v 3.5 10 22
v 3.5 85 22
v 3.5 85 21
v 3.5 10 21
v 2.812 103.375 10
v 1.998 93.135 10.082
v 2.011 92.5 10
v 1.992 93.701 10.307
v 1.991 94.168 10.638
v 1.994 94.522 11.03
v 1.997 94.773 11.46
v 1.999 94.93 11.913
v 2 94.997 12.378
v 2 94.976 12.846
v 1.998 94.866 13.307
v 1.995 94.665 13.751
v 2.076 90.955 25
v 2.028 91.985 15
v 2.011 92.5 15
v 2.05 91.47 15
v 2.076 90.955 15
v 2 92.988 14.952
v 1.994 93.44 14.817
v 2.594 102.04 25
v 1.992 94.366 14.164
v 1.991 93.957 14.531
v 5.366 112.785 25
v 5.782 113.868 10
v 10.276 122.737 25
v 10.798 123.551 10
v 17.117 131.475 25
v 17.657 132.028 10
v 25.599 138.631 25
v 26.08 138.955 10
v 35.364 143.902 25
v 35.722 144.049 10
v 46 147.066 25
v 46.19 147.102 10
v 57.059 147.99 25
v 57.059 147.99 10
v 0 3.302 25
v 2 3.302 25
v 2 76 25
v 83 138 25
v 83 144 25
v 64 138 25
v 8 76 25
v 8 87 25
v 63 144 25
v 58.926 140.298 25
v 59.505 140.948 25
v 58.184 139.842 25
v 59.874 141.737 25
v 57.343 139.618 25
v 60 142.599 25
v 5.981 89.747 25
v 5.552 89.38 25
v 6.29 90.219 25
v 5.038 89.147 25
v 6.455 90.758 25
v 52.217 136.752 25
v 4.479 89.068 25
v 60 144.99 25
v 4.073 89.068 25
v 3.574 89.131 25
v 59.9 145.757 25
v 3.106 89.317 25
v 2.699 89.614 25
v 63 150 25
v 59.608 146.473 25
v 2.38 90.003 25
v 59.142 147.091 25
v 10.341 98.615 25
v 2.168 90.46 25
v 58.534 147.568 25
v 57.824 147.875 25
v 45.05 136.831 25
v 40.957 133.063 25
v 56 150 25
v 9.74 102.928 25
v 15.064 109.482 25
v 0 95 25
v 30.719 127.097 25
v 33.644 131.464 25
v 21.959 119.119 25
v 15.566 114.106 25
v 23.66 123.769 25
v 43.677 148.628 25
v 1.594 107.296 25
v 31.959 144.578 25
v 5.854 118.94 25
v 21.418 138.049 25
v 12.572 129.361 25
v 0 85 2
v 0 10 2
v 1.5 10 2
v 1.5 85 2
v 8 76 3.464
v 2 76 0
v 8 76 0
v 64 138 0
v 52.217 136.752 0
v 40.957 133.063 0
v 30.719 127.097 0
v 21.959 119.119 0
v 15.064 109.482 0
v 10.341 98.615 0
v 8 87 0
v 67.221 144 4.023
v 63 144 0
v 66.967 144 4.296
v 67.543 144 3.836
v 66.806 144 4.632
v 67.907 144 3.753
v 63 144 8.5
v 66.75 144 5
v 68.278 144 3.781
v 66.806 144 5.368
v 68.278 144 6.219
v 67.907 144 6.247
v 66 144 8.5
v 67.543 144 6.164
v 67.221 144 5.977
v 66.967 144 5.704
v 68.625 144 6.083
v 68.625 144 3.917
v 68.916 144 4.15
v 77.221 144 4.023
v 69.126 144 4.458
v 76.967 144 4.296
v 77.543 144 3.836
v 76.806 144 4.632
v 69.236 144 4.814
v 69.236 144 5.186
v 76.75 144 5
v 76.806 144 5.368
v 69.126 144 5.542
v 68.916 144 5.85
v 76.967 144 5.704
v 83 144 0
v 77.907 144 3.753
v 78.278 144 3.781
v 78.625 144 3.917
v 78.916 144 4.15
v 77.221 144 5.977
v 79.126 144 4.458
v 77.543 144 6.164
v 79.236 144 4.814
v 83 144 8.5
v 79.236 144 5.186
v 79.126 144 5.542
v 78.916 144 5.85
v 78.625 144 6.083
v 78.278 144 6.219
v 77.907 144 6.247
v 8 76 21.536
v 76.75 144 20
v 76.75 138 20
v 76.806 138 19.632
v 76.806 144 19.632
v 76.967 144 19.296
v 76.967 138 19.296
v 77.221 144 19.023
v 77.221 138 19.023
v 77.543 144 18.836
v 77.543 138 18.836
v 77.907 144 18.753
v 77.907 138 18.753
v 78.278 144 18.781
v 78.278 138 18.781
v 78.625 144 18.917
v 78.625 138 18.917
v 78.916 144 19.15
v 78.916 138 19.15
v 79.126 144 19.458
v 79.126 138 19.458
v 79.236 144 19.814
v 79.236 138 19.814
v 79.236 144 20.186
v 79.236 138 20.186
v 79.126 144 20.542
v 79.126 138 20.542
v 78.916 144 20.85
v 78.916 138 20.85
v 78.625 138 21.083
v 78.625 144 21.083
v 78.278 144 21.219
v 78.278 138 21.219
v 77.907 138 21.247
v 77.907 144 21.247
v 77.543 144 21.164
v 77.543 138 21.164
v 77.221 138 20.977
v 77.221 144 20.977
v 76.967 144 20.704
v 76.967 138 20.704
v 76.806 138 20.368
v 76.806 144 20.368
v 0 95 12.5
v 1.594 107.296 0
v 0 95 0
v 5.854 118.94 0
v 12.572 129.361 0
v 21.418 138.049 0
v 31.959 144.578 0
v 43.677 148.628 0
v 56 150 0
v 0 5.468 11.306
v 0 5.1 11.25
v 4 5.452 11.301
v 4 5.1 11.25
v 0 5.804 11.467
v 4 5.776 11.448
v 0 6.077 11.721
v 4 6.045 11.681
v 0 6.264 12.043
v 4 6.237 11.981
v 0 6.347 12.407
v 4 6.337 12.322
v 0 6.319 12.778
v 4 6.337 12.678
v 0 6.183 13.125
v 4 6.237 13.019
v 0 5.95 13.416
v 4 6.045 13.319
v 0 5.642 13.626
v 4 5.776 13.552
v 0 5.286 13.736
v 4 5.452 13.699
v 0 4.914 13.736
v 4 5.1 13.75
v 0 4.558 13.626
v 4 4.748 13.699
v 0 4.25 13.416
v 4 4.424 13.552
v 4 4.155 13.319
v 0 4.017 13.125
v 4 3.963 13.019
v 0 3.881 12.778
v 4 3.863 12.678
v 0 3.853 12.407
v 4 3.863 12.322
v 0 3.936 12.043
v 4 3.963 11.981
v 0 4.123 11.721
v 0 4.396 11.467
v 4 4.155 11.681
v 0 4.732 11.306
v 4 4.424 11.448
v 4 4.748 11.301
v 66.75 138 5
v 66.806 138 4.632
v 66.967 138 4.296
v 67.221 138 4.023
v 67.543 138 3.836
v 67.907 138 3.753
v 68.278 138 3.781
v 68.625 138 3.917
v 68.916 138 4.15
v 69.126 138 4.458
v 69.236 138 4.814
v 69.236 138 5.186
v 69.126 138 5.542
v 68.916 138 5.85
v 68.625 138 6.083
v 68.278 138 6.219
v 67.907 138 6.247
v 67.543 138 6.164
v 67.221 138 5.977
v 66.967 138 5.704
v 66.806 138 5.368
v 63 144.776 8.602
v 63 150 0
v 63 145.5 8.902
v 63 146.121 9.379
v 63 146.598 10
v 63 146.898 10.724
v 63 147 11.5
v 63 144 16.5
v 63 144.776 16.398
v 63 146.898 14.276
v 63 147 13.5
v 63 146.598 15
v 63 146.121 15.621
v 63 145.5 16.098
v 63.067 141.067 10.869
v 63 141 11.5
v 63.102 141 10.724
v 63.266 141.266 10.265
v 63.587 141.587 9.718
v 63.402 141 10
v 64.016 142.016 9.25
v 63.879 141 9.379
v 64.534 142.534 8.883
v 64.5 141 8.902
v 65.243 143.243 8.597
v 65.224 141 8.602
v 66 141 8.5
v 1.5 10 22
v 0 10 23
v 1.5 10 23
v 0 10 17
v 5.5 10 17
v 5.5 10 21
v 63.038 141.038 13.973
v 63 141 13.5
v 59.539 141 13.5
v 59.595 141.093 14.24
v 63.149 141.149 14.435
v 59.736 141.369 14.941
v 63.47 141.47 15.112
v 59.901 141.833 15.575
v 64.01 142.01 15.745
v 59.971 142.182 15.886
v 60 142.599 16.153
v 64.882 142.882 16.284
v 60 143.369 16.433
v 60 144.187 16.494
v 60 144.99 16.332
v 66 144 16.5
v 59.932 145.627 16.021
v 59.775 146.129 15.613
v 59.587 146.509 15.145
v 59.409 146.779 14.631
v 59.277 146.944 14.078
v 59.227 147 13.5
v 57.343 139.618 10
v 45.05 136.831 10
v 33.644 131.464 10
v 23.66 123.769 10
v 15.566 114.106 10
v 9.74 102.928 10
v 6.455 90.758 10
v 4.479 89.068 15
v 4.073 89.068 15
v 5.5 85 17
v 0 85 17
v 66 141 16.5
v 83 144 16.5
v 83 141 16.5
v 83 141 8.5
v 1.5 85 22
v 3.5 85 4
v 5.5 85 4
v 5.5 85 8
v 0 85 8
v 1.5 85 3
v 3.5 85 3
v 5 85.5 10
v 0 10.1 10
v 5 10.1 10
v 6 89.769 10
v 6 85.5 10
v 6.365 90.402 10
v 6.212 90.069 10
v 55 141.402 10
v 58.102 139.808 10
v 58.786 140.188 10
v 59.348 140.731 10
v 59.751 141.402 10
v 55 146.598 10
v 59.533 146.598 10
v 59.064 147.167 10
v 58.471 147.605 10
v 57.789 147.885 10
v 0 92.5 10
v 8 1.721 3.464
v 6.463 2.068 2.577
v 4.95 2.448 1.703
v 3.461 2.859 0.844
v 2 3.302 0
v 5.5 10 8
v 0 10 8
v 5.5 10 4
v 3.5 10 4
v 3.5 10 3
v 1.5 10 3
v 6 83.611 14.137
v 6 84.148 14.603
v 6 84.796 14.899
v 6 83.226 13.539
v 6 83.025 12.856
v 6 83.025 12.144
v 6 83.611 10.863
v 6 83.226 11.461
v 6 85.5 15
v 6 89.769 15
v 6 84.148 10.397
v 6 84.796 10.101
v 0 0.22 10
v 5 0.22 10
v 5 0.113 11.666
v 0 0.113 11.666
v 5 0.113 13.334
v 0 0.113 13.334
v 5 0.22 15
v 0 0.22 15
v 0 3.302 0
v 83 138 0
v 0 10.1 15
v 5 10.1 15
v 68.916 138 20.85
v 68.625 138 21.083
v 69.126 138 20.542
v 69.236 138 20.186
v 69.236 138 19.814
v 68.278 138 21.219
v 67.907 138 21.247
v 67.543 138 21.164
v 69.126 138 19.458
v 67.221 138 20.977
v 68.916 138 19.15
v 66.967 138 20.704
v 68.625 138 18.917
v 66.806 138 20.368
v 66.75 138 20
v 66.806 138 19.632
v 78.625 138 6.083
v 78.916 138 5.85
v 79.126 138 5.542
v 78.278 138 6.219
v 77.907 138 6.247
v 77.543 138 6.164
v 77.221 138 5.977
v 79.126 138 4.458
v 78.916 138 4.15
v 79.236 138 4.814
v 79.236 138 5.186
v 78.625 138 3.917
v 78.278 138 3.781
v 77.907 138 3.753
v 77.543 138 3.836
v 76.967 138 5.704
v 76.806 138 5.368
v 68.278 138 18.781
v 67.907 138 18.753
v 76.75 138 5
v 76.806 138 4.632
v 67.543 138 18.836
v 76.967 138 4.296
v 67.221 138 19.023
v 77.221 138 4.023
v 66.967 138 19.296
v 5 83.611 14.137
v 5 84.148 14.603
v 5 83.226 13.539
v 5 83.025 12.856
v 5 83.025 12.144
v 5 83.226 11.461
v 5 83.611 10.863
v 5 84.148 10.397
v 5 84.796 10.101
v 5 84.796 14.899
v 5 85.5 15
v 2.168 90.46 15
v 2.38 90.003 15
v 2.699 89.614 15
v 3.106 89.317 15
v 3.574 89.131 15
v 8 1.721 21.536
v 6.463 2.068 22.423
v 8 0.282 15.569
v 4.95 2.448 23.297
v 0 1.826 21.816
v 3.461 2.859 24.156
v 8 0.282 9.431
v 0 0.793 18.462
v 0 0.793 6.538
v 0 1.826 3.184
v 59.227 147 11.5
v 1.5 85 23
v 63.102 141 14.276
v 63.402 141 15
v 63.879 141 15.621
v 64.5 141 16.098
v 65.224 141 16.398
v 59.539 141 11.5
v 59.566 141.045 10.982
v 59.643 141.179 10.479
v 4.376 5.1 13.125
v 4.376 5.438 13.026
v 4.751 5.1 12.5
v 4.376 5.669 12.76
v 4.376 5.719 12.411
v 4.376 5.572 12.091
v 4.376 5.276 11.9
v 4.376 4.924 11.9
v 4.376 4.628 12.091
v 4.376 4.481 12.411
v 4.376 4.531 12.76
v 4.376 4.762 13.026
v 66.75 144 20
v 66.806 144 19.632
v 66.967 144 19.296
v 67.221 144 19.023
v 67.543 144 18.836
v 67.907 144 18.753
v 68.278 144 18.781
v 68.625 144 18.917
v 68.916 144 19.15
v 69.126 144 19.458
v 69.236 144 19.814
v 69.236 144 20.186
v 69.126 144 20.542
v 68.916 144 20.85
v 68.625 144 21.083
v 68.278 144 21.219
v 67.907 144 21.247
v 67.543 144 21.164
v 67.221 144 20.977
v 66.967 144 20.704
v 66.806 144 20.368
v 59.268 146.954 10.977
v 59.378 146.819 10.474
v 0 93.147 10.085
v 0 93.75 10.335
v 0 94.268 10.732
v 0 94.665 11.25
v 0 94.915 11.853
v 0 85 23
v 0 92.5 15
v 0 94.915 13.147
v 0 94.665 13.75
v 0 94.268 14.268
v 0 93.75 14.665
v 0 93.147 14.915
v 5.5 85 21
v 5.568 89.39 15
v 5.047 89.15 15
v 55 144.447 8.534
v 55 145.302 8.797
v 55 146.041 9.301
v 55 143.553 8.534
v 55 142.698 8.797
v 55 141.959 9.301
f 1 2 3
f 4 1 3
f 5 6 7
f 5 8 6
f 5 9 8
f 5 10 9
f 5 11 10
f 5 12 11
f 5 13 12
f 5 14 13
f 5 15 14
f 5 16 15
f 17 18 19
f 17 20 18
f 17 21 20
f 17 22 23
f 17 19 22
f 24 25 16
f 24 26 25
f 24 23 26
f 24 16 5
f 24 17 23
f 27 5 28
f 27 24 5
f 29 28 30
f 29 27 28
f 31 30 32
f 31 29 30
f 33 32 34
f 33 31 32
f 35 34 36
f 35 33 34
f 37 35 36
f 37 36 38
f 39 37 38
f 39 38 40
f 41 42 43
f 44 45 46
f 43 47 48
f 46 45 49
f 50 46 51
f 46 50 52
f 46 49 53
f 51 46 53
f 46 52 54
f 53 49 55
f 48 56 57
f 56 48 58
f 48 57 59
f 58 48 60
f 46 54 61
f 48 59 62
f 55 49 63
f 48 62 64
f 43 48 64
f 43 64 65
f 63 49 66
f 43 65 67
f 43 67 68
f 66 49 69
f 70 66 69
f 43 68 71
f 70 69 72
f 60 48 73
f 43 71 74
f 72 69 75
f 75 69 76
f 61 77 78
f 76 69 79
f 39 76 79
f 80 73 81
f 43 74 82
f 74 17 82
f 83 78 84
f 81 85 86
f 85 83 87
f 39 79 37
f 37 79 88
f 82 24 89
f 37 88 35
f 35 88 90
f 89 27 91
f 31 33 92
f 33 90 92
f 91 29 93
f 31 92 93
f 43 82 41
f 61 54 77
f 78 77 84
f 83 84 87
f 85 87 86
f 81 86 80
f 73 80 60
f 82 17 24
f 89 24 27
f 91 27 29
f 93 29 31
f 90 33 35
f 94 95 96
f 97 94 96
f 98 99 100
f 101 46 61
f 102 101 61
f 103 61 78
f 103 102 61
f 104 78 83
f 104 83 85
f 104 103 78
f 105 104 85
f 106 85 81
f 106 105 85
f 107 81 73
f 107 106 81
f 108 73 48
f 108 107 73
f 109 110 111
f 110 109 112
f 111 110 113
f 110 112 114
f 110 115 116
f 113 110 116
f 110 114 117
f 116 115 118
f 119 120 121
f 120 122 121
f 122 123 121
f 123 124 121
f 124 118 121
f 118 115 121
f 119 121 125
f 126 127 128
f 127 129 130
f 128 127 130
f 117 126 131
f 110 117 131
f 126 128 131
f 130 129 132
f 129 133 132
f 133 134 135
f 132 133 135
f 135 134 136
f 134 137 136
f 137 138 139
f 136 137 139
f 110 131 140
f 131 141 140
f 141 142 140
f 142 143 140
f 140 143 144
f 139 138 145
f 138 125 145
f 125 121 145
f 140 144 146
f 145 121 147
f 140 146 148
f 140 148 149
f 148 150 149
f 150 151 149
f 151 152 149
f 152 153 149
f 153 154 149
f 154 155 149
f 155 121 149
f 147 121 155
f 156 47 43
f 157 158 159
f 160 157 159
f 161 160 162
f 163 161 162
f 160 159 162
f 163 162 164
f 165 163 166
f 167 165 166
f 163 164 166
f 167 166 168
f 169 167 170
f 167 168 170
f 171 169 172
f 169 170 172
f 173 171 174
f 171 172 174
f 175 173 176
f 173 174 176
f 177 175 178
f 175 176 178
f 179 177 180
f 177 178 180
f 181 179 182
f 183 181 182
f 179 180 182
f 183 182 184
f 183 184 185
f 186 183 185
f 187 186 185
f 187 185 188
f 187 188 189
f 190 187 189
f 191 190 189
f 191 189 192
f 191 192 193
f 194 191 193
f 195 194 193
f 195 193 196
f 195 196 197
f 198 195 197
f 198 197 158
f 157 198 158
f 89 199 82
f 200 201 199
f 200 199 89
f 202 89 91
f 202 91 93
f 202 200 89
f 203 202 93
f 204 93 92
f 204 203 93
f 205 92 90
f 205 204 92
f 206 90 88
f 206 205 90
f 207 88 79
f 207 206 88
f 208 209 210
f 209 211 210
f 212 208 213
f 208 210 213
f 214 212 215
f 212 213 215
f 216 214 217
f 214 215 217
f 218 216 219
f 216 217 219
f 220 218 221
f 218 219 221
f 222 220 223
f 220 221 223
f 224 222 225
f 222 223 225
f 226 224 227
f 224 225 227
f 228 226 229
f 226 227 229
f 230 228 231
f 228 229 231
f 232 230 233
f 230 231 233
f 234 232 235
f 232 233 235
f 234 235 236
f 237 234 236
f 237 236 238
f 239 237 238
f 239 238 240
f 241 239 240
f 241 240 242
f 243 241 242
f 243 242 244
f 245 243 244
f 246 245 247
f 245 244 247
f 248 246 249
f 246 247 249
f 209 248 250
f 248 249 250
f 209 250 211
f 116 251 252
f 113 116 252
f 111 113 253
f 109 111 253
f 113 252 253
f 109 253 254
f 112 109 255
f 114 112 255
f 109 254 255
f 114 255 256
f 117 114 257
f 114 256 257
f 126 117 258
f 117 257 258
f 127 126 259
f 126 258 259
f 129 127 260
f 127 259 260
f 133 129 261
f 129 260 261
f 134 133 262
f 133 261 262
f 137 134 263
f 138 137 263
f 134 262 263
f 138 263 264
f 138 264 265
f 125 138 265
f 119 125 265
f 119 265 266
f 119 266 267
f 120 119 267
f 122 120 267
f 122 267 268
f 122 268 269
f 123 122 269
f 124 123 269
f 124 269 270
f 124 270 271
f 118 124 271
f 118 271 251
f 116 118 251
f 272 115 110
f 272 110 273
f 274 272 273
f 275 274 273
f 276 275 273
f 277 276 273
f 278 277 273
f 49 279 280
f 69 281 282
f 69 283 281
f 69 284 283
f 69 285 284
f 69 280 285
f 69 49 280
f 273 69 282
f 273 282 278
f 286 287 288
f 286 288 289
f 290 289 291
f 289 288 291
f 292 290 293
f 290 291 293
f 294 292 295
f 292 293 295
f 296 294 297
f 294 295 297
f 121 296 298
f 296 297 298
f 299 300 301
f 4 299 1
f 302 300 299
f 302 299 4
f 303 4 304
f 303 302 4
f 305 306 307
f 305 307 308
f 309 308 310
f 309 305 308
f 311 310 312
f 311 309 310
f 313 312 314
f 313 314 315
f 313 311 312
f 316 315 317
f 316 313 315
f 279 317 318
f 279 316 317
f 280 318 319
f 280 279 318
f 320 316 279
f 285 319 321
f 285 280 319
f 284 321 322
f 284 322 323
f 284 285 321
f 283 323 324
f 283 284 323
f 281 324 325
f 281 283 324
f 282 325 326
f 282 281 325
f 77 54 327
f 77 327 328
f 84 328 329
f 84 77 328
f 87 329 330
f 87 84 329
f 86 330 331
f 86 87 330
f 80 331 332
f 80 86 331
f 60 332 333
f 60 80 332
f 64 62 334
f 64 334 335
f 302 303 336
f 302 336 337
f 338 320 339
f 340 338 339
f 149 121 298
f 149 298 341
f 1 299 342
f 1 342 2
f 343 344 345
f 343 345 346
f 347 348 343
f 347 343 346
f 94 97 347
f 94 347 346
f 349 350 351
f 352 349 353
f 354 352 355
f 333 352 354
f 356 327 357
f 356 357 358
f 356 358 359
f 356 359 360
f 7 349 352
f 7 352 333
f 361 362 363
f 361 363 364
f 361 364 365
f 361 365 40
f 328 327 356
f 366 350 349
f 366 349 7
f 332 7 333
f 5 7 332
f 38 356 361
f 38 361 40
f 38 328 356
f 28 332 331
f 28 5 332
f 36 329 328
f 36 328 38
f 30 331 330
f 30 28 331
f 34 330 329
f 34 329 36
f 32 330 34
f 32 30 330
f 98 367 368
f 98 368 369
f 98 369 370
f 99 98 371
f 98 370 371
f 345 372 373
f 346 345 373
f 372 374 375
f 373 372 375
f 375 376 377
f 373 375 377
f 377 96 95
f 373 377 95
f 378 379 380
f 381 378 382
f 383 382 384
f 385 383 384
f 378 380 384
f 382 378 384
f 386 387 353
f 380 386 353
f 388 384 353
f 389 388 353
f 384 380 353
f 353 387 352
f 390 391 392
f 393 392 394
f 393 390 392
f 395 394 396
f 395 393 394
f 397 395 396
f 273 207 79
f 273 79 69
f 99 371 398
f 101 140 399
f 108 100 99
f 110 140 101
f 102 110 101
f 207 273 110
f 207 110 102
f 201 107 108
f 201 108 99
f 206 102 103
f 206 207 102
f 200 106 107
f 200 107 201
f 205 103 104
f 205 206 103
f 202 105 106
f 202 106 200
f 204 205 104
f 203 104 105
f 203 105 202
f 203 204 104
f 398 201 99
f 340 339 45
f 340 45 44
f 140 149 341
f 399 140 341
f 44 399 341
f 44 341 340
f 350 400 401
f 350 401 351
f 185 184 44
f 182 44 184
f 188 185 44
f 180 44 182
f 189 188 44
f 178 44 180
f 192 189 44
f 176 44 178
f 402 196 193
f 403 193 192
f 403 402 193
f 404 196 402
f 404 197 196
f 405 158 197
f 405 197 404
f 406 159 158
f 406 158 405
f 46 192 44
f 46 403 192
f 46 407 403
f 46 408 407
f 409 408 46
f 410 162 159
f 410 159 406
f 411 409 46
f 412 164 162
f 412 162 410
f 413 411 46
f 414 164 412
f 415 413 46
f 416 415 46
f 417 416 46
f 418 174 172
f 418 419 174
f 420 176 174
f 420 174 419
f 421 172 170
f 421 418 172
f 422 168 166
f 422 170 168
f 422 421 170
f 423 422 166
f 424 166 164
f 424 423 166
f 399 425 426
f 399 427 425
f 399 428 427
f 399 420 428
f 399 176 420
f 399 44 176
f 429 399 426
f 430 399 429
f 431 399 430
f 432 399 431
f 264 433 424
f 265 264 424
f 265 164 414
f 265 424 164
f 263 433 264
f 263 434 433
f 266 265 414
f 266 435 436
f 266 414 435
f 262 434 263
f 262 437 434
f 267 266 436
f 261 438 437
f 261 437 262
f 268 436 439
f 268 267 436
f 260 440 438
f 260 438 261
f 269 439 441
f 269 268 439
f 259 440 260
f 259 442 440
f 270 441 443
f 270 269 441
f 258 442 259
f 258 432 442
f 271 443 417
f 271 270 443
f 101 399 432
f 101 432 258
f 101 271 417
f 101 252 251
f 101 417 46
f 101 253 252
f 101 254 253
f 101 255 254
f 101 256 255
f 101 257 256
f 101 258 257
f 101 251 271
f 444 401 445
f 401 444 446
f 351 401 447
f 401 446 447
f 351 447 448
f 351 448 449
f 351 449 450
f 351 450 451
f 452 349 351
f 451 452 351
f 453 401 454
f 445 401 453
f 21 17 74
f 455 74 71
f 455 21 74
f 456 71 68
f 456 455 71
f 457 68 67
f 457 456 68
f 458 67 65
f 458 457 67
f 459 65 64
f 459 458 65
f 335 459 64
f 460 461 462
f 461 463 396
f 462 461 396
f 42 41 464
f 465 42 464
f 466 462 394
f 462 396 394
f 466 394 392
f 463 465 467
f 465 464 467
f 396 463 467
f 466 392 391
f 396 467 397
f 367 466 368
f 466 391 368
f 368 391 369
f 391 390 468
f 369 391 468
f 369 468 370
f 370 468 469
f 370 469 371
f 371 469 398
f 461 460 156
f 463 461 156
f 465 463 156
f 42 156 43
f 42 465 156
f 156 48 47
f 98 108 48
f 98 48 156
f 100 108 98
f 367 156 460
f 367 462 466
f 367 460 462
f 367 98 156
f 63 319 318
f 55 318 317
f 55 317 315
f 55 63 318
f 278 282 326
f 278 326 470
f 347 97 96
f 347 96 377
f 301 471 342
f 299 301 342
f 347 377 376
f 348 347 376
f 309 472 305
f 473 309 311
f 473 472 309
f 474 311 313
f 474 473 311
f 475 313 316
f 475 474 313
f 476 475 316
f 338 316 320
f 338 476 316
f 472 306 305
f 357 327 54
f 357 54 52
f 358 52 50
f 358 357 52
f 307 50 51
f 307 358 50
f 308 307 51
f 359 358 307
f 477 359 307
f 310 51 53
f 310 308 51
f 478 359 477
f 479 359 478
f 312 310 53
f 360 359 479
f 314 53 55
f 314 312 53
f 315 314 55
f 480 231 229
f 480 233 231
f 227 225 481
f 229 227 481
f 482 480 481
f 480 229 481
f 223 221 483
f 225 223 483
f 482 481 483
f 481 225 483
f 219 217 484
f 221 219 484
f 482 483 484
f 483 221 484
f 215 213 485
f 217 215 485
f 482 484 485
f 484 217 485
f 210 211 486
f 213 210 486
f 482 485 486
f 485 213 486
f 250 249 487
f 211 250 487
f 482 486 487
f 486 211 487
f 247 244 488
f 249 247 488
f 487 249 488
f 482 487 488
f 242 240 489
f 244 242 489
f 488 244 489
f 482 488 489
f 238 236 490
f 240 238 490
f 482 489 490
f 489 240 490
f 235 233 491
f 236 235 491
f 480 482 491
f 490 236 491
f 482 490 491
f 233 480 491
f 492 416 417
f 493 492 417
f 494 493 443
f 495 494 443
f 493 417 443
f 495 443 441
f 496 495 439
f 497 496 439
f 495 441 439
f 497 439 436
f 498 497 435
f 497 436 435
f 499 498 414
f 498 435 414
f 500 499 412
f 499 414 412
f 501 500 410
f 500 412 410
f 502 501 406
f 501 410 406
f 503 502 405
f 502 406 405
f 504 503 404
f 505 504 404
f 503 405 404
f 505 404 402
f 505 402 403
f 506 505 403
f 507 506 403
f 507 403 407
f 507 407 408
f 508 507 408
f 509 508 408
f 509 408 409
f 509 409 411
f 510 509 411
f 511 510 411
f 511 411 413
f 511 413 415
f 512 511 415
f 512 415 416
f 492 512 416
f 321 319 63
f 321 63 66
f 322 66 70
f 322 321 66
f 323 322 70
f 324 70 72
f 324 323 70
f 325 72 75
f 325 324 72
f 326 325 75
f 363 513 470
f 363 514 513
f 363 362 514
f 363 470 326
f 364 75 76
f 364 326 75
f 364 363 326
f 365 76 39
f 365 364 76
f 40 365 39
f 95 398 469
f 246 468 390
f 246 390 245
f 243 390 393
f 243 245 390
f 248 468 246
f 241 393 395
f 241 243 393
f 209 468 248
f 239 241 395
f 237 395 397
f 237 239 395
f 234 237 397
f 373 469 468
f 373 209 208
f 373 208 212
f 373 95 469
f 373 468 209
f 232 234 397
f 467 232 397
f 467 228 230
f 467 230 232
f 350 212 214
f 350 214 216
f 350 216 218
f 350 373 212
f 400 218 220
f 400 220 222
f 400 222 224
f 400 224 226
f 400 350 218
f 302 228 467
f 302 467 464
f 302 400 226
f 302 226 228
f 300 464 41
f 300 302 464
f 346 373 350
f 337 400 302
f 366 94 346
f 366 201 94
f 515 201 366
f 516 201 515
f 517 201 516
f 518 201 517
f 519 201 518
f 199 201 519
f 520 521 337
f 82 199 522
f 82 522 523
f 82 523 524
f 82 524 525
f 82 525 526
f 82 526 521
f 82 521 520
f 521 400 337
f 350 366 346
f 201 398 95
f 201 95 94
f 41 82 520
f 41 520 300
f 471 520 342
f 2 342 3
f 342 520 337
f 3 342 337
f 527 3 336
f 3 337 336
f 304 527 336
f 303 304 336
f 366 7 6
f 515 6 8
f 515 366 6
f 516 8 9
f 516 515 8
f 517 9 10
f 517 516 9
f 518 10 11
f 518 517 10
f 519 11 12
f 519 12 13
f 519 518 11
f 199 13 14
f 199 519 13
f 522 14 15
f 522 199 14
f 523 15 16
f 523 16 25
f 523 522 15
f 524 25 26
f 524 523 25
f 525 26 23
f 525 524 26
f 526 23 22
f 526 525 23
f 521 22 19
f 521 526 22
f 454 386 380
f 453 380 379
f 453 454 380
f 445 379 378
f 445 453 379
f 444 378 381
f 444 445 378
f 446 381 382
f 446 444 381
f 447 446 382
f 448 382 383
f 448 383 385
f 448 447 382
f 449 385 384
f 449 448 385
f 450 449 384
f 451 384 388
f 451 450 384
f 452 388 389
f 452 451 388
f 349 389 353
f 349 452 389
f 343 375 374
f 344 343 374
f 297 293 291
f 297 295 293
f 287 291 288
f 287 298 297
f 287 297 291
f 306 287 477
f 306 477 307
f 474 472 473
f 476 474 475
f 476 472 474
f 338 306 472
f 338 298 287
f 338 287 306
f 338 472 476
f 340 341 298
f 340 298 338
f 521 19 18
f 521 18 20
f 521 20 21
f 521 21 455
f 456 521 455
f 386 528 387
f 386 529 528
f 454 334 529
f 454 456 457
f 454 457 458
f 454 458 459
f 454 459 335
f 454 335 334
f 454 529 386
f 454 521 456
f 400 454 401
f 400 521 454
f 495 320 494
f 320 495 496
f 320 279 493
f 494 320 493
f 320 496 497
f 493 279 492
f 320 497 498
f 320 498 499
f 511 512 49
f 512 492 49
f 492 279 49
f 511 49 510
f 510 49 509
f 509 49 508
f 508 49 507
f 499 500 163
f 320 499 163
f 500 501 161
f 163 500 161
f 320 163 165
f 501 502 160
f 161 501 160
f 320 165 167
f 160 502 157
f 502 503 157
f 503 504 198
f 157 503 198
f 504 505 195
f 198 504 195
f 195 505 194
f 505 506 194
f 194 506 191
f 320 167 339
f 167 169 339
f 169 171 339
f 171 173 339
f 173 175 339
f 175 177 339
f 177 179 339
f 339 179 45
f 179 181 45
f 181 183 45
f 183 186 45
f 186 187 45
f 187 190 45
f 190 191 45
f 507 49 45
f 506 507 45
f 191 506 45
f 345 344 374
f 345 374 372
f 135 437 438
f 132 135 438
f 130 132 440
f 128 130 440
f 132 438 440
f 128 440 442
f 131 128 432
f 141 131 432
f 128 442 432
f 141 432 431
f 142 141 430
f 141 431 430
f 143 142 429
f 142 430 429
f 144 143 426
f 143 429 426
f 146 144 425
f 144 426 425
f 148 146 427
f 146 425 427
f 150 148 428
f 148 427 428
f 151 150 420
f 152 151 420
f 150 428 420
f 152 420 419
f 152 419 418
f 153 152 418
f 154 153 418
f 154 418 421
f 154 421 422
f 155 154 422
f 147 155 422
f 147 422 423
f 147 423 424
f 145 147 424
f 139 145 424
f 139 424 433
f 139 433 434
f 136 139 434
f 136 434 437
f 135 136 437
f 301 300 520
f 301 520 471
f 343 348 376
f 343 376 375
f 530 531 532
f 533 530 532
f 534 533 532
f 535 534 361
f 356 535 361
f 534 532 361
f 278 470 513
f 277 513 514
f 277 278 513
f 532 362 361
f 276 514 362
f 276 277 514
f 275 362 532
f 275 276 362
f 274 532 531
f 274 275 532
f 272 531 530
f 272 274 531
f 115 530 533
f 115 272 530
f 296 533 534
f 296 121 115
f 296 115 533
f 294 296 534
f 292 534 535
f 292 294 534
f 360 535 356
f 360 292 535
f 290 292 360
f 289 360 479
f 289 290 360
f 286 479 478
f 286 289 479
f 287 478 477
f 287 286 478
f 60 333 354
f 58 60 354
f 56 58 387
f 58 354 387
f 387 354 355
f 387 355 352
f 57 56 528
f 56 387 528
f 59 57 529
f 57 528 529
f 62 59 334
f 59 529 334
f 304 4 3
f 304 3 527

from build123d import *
from OCP.BRepAlgoAPI import BRepAlgoAPI_Cut
from OCP.TopTools import TopTools_ListOfShape

# Parameters (mm, degrees)
EXTRUDE_1_DEPTH      = 25
SKETCH_2_W           = 20
SKETCH_2_H           = 6
CUT_EXTRUDE_1_DEPTH  = 174.245490562
CUT_EXTRUDE_2_DEPTH  = 76
CUT_EXTRUDE_4_DEPTH  = 5
CUT_EXTRUDE_3_REACH  = 175.245
FILLET_3_R           = 2
FILLET_4_R           = 3
CUT_EXTRUDE_6_DEPTH  = 75
M3X0_51_D            = 2.5
CUT_EXTRUDE_7_REACH  = 175.245
SKETCH_13_W          = 20
SKETCH_13_H          = 8
CUT_EXTRUDE_8_DEPTH  = 3
FILLET_8_R           = 3
CUT_EXTRUDE_9_DEPTH  = 28
CUT_EXTRUDE_10_DEPTH = 6
EXTRUDE_2_DEPTH      = 5
M3X0_52_D            = 2.5
M3X0_52_DEPTH        = 4
M3X0_52_TIP          = 0.751075774


with BuildPart() as part:
    # Эскиз1 → Бобышка-Вытянуть1 (new body)
    with BuildSketch(Plane.XY):
        with BuildLine():
            Line((0, 0), (0, 95))
            ThreePointArc((0, 95), (16.753981094, 133.950491977), (56, 150))
            Line((56, 150), (83, 150))
            Line((83, 150), (83, 138))
            Line((83, 138), (64, 138))
            ThreePointArc((64, 138), (26.128506763, 123.339286692), (8, 87))
            Line((8, 87), (8, 0))
            Line((8, 0), (0, 0))
        make_face()
    extrude(amount=EXTRUDE_1_DEPTH)

    # Эскиз2 → Вырез-Вытянуть1 (cut, through all)
    with BuildSketch(Plane.XY.offset(25)):
        with Locations((73, 147)):
            Rectangle(SKETCH_2_W, SKETCH_2_H)
    extrude(amount=-CUT_EXTRUDE_1_DEPTH, mode=Mode.SUBTRACT)

    # Эскиз5 → Вырез-Вытянуть2 (cut)
    with BuildSketch(Plane.XZ):
        Polygon((8, 3.464101615), (2, 0), (8, 0), align=None)
        Polygon((8, 25), (8, 21.535898385), (2, 25), align=None)
    extrude(amount=-CUT_EXTRUDE_2_DEPTH, mode=Mode.SUBTRACT)

    # Эскиз6 → Вырез-Вытянуть4 (cut)
    with BuildSketch(Plane.ZY):
        with BuildLine():
            Line((10, -11.91606518), (10, 92.5))
            ThreePointArc((10, 92.5), (12.5, 95), (15, 92.5))
            Line((15, 92.5), (15, -11.91606518))
            ThreePointArc((15, -11.91606518), (12.5, -14.41606518), (10, -11.91606518))
        make_face()
    extrude(amount=-CUT_EXTRUDE_4_DEPTH, mode=Mode.SUBTRACT)

    # Вырез-Вытянуть3: up to this face of the body (flat: up to its plane)
    cut_extrude_3_end = Plane(part.part.faces().sort_by_distance((2.5, 46.25, 10))[0])
    # Эскиз3 → Вырез-Вытянуть3 (cut, up to the picked face)
    with BuildSketch(Plane(origin=(0, 0, 25), x_dir=(-1, 0, 0), z_dir=(0, 0, -1)), mode=Mode.PRIVATE) as cut_extrude_3_sk1:
        with BuildLine():
            Line((-60, 147.851673111), (-60, 139.862487056))
            ThreePointArc((-60, 139.862487056), (-24.008081752, 124.100361226), (-6.215777406, 89.067566648))
            Line((-6.215777406, 89.067566648), (-2.215777406, 89.067566648))
            ThreePointArc((-2.215777406, 89.067566648), (-17.483639866, 131.852128074), (-60, 147.851673111))
        make_face()
    cut_extrude_3_tool1 = split(extrude(cut_extrude_3_sk1.sketch, amount=CUT_EXTRUDE_3_REACH, mode=Mode.PRIVATE), bisect_by=cut_extrude_3_end, keep=Keep.BOTH, mode=Mode.PRIVATE)
    add(cut_extrude_3_tool1.solids().sort_by(Axis((26.403402, 126.933471, 25), (0, 0, -1)))[0], mode=Mode.SUBTRACT)

    # Скругление3
    fillet_3_edges = [part.edges().sort_by_distance(p)[0] for p in [
        (6.215777406, 89.067566648, 17.5),
        (2.215777406, 89.067566648, 20),
    ]]
    fillet(fillet_3_edges, radius=FILLET_3_R)

    # Скругление4
    fillet_4_edges = [part.edges().sort_by_distance(p)[0] for p in [
        (60, 139.862487056, 17.5),
        (60, 147.851673111, 17.5),
    ]]
    fillet(fillet_4_edges, radius=FILLET_4_R)

    # Эскиз8 → Вырез-Вытянуть6 (cut)
    with BuildSketch(Plane(origin=(0, 10, 0), x_dir=(1, 0, 0), z_dir=(0, 1, 0))):
        Polygon((0, -2), (1.5, -2), (1.5, -3), (3.5, -3), (3.5, -4), (5.5, -4), (5.5, -8), (0, -8), align=None)
        Polygon((3.5, -22), (3.5, -21), (5.5, -21), (5.5, -17), (0, -17), (0, -23), (1.5, -23), (1.5, -22), align=None)
    extrude(amount=CUT_EXTRUDE_6_DEPTH, mode=Mode.SUBTRACT)

    # Отверстие обработанное метчиком M3x0.51 (through all)
    with Locations(Plane(origin=(19.191951444, 144, 18.799685968), x_dir=(1, 0, 0), z_dir=(0, 1, 0))):
        with Locations((48.808048556, 13.799685968), (58.808048556, 13.799685968), (58.808048556, -1.200314032), (48.808048556, -1.200314032)):
            Hole(M3X0_51_D / 2)

    # Эскиз12 → Вырез-Вытянуть7 (cut, up to next)
    with BuildSketch(Plane.ZY, mode=Mode.PRIVATE) as cut_extrude_7_sk1:
        with BuildLine():
            Line((0, 3.30197377), (0, 0))
            Line((0, 0), (12.5, 0))
            Line((12.5, 0), (25, 0))
            Line((25, 0), (25, 3.30197377))
            ThreePointArc((25, 3.30197377), (12.5, 0.1), (0, 3.30197377))
        make_face()
    cut_extrude_7_tool1 = extrude(cut_extrude_7_sk1.sketch, amount=-CUT_EXTRUDE_7_REACH, mode=Mode.PRIVATE) & part.part
    add(cut_extrude_7_tool1.solids().sort_by_distance((0, 1.650987, 0.252171))[0], mode=Mode.SUBTRACT)

    # Эскиз13 → Вырез-Вытянуть8 (cut)
    with BuildSketch(Plane(origin=(0, 144, 0), x_dir=(1, 0, 0), z_dir=(0, 1, 0))):
        with Locations((73, -12.5)):
            Rectangle(SKETCH_13_W, SKETCH_13_H)
    extrude(amount=-CUT_EXTRUDE_8_DEPTH, mode=Mode.SUBTRACT)

    # Скругление8
    fillet_8_edges = [part.edges().sort_by_distance(p)[0] for p in [
        (63, 142.5, 16.5),
        (63, 142.5, 8.5),
    ]]
    fillet(fillet_8_edges, radius=FILLET_8_R)


with BuildPart() as cut_extrude_9_tool:
    # Эскиз14 → Вырез-Вытянуть9 (new body)
    with BuildSketch(Plane(origin=(83, 0, 0), x_dir=(0, 0, -1), z_dir=(1, 0, 0))):
        with BuildLine():
            Line((-13.5, 147), (-11.5, 147))
            ThreePointArc((-11.5, 147), (-8.5, 144), (-11.5, 141))
            Line((-11.5, 141), (-13.5, 141))
            ThreePointArc((-13.5, 141), (-16.5, 144), (-13.5, 147))
        make_face()
    extrude(amount=-CUT_EXTRUDE_9_DEPTH)


with BuildPart() as part_1:
    add(part.part)

    # Вырез-Вытянуть9: cut by cut_extrude_9_tool, with a tolerance
    cut_extrude_9_stock = TopTools_ListOfShape()
    cut_extrude_9_stock.Append(part_1.part.wrapped)
    cut_extrude_9_tools = TopTools_ListOfShape()
    cut_extrude_9_tools.Append(cut_extrude_9_tool.part.wrapped)
    cut_extrude_9_cut = BRepAlgoAPI_Cut()
    cut_extrude_9_cut.SetArguments(cut_extrude_9_stock)
    cut_extrude_9_cut.SetTools(cut_extrude_9_tools)
    cut_extrude_9_cut.SetFuzzyValue(0.00001)
    cut_extrude_9_cut.Build()
    add(Compound.cast(cut_extrude_9_cut.Shape()).solids(), mode=Mode.REPLACE)

    # Эскиз15 → Вырез-Вытянуть10 (cut)
    with BuildSketch(Plane.ZY):
        with BuildLine():
            Line((15, 92.5), (15, 85.5))
            ThreePointArc((15, 85.5), (12.5, 83), (10, 85.5))
            Line((10, 85.5), (10, 92.5))
            ThreePointArc((10, 92.5), (12.5, 95), (15, 92.5))
        make_face()
    extrude(amount=-CUT_EXTRUDE_10_DEPTH, mode=Mode.SUBTRACT)

    # Эскиз19 → Бобышка-Вытянуть2 (add)
    with BuildSketch(Plane.ZY):
        with BuildLine():
            Line((10, 10.1), (10, 0.220471411))
            ThreePointArc((10, 0.220471411), (12.5, 0.1), (15, 0.220471411))
            Line((15, 0.220471411), (15, 10.1))
            Line((15, 10.1), (10, 10.1))
        make_face()
    extrude(amount=-EXTRUDE_2_DEPTH)

    # Отверстие обработанное метчиком M3x0.52
    with Locations(Plane.ZY):
        with Locations((12.5, 5.1)):
            Hole(M3X0_52_D / 2, depth=M3X0_52_DEPTH)
            with Locations((0, 0, -(M3X0_52_DEPTH + M3X0_52_TIP / 2))):  # 118° drill point
                Cone(0, M3X0_52_D / 2, M3X0_52_TIP, mode=Mode.SUBTRACT)


solid = part_1.part
